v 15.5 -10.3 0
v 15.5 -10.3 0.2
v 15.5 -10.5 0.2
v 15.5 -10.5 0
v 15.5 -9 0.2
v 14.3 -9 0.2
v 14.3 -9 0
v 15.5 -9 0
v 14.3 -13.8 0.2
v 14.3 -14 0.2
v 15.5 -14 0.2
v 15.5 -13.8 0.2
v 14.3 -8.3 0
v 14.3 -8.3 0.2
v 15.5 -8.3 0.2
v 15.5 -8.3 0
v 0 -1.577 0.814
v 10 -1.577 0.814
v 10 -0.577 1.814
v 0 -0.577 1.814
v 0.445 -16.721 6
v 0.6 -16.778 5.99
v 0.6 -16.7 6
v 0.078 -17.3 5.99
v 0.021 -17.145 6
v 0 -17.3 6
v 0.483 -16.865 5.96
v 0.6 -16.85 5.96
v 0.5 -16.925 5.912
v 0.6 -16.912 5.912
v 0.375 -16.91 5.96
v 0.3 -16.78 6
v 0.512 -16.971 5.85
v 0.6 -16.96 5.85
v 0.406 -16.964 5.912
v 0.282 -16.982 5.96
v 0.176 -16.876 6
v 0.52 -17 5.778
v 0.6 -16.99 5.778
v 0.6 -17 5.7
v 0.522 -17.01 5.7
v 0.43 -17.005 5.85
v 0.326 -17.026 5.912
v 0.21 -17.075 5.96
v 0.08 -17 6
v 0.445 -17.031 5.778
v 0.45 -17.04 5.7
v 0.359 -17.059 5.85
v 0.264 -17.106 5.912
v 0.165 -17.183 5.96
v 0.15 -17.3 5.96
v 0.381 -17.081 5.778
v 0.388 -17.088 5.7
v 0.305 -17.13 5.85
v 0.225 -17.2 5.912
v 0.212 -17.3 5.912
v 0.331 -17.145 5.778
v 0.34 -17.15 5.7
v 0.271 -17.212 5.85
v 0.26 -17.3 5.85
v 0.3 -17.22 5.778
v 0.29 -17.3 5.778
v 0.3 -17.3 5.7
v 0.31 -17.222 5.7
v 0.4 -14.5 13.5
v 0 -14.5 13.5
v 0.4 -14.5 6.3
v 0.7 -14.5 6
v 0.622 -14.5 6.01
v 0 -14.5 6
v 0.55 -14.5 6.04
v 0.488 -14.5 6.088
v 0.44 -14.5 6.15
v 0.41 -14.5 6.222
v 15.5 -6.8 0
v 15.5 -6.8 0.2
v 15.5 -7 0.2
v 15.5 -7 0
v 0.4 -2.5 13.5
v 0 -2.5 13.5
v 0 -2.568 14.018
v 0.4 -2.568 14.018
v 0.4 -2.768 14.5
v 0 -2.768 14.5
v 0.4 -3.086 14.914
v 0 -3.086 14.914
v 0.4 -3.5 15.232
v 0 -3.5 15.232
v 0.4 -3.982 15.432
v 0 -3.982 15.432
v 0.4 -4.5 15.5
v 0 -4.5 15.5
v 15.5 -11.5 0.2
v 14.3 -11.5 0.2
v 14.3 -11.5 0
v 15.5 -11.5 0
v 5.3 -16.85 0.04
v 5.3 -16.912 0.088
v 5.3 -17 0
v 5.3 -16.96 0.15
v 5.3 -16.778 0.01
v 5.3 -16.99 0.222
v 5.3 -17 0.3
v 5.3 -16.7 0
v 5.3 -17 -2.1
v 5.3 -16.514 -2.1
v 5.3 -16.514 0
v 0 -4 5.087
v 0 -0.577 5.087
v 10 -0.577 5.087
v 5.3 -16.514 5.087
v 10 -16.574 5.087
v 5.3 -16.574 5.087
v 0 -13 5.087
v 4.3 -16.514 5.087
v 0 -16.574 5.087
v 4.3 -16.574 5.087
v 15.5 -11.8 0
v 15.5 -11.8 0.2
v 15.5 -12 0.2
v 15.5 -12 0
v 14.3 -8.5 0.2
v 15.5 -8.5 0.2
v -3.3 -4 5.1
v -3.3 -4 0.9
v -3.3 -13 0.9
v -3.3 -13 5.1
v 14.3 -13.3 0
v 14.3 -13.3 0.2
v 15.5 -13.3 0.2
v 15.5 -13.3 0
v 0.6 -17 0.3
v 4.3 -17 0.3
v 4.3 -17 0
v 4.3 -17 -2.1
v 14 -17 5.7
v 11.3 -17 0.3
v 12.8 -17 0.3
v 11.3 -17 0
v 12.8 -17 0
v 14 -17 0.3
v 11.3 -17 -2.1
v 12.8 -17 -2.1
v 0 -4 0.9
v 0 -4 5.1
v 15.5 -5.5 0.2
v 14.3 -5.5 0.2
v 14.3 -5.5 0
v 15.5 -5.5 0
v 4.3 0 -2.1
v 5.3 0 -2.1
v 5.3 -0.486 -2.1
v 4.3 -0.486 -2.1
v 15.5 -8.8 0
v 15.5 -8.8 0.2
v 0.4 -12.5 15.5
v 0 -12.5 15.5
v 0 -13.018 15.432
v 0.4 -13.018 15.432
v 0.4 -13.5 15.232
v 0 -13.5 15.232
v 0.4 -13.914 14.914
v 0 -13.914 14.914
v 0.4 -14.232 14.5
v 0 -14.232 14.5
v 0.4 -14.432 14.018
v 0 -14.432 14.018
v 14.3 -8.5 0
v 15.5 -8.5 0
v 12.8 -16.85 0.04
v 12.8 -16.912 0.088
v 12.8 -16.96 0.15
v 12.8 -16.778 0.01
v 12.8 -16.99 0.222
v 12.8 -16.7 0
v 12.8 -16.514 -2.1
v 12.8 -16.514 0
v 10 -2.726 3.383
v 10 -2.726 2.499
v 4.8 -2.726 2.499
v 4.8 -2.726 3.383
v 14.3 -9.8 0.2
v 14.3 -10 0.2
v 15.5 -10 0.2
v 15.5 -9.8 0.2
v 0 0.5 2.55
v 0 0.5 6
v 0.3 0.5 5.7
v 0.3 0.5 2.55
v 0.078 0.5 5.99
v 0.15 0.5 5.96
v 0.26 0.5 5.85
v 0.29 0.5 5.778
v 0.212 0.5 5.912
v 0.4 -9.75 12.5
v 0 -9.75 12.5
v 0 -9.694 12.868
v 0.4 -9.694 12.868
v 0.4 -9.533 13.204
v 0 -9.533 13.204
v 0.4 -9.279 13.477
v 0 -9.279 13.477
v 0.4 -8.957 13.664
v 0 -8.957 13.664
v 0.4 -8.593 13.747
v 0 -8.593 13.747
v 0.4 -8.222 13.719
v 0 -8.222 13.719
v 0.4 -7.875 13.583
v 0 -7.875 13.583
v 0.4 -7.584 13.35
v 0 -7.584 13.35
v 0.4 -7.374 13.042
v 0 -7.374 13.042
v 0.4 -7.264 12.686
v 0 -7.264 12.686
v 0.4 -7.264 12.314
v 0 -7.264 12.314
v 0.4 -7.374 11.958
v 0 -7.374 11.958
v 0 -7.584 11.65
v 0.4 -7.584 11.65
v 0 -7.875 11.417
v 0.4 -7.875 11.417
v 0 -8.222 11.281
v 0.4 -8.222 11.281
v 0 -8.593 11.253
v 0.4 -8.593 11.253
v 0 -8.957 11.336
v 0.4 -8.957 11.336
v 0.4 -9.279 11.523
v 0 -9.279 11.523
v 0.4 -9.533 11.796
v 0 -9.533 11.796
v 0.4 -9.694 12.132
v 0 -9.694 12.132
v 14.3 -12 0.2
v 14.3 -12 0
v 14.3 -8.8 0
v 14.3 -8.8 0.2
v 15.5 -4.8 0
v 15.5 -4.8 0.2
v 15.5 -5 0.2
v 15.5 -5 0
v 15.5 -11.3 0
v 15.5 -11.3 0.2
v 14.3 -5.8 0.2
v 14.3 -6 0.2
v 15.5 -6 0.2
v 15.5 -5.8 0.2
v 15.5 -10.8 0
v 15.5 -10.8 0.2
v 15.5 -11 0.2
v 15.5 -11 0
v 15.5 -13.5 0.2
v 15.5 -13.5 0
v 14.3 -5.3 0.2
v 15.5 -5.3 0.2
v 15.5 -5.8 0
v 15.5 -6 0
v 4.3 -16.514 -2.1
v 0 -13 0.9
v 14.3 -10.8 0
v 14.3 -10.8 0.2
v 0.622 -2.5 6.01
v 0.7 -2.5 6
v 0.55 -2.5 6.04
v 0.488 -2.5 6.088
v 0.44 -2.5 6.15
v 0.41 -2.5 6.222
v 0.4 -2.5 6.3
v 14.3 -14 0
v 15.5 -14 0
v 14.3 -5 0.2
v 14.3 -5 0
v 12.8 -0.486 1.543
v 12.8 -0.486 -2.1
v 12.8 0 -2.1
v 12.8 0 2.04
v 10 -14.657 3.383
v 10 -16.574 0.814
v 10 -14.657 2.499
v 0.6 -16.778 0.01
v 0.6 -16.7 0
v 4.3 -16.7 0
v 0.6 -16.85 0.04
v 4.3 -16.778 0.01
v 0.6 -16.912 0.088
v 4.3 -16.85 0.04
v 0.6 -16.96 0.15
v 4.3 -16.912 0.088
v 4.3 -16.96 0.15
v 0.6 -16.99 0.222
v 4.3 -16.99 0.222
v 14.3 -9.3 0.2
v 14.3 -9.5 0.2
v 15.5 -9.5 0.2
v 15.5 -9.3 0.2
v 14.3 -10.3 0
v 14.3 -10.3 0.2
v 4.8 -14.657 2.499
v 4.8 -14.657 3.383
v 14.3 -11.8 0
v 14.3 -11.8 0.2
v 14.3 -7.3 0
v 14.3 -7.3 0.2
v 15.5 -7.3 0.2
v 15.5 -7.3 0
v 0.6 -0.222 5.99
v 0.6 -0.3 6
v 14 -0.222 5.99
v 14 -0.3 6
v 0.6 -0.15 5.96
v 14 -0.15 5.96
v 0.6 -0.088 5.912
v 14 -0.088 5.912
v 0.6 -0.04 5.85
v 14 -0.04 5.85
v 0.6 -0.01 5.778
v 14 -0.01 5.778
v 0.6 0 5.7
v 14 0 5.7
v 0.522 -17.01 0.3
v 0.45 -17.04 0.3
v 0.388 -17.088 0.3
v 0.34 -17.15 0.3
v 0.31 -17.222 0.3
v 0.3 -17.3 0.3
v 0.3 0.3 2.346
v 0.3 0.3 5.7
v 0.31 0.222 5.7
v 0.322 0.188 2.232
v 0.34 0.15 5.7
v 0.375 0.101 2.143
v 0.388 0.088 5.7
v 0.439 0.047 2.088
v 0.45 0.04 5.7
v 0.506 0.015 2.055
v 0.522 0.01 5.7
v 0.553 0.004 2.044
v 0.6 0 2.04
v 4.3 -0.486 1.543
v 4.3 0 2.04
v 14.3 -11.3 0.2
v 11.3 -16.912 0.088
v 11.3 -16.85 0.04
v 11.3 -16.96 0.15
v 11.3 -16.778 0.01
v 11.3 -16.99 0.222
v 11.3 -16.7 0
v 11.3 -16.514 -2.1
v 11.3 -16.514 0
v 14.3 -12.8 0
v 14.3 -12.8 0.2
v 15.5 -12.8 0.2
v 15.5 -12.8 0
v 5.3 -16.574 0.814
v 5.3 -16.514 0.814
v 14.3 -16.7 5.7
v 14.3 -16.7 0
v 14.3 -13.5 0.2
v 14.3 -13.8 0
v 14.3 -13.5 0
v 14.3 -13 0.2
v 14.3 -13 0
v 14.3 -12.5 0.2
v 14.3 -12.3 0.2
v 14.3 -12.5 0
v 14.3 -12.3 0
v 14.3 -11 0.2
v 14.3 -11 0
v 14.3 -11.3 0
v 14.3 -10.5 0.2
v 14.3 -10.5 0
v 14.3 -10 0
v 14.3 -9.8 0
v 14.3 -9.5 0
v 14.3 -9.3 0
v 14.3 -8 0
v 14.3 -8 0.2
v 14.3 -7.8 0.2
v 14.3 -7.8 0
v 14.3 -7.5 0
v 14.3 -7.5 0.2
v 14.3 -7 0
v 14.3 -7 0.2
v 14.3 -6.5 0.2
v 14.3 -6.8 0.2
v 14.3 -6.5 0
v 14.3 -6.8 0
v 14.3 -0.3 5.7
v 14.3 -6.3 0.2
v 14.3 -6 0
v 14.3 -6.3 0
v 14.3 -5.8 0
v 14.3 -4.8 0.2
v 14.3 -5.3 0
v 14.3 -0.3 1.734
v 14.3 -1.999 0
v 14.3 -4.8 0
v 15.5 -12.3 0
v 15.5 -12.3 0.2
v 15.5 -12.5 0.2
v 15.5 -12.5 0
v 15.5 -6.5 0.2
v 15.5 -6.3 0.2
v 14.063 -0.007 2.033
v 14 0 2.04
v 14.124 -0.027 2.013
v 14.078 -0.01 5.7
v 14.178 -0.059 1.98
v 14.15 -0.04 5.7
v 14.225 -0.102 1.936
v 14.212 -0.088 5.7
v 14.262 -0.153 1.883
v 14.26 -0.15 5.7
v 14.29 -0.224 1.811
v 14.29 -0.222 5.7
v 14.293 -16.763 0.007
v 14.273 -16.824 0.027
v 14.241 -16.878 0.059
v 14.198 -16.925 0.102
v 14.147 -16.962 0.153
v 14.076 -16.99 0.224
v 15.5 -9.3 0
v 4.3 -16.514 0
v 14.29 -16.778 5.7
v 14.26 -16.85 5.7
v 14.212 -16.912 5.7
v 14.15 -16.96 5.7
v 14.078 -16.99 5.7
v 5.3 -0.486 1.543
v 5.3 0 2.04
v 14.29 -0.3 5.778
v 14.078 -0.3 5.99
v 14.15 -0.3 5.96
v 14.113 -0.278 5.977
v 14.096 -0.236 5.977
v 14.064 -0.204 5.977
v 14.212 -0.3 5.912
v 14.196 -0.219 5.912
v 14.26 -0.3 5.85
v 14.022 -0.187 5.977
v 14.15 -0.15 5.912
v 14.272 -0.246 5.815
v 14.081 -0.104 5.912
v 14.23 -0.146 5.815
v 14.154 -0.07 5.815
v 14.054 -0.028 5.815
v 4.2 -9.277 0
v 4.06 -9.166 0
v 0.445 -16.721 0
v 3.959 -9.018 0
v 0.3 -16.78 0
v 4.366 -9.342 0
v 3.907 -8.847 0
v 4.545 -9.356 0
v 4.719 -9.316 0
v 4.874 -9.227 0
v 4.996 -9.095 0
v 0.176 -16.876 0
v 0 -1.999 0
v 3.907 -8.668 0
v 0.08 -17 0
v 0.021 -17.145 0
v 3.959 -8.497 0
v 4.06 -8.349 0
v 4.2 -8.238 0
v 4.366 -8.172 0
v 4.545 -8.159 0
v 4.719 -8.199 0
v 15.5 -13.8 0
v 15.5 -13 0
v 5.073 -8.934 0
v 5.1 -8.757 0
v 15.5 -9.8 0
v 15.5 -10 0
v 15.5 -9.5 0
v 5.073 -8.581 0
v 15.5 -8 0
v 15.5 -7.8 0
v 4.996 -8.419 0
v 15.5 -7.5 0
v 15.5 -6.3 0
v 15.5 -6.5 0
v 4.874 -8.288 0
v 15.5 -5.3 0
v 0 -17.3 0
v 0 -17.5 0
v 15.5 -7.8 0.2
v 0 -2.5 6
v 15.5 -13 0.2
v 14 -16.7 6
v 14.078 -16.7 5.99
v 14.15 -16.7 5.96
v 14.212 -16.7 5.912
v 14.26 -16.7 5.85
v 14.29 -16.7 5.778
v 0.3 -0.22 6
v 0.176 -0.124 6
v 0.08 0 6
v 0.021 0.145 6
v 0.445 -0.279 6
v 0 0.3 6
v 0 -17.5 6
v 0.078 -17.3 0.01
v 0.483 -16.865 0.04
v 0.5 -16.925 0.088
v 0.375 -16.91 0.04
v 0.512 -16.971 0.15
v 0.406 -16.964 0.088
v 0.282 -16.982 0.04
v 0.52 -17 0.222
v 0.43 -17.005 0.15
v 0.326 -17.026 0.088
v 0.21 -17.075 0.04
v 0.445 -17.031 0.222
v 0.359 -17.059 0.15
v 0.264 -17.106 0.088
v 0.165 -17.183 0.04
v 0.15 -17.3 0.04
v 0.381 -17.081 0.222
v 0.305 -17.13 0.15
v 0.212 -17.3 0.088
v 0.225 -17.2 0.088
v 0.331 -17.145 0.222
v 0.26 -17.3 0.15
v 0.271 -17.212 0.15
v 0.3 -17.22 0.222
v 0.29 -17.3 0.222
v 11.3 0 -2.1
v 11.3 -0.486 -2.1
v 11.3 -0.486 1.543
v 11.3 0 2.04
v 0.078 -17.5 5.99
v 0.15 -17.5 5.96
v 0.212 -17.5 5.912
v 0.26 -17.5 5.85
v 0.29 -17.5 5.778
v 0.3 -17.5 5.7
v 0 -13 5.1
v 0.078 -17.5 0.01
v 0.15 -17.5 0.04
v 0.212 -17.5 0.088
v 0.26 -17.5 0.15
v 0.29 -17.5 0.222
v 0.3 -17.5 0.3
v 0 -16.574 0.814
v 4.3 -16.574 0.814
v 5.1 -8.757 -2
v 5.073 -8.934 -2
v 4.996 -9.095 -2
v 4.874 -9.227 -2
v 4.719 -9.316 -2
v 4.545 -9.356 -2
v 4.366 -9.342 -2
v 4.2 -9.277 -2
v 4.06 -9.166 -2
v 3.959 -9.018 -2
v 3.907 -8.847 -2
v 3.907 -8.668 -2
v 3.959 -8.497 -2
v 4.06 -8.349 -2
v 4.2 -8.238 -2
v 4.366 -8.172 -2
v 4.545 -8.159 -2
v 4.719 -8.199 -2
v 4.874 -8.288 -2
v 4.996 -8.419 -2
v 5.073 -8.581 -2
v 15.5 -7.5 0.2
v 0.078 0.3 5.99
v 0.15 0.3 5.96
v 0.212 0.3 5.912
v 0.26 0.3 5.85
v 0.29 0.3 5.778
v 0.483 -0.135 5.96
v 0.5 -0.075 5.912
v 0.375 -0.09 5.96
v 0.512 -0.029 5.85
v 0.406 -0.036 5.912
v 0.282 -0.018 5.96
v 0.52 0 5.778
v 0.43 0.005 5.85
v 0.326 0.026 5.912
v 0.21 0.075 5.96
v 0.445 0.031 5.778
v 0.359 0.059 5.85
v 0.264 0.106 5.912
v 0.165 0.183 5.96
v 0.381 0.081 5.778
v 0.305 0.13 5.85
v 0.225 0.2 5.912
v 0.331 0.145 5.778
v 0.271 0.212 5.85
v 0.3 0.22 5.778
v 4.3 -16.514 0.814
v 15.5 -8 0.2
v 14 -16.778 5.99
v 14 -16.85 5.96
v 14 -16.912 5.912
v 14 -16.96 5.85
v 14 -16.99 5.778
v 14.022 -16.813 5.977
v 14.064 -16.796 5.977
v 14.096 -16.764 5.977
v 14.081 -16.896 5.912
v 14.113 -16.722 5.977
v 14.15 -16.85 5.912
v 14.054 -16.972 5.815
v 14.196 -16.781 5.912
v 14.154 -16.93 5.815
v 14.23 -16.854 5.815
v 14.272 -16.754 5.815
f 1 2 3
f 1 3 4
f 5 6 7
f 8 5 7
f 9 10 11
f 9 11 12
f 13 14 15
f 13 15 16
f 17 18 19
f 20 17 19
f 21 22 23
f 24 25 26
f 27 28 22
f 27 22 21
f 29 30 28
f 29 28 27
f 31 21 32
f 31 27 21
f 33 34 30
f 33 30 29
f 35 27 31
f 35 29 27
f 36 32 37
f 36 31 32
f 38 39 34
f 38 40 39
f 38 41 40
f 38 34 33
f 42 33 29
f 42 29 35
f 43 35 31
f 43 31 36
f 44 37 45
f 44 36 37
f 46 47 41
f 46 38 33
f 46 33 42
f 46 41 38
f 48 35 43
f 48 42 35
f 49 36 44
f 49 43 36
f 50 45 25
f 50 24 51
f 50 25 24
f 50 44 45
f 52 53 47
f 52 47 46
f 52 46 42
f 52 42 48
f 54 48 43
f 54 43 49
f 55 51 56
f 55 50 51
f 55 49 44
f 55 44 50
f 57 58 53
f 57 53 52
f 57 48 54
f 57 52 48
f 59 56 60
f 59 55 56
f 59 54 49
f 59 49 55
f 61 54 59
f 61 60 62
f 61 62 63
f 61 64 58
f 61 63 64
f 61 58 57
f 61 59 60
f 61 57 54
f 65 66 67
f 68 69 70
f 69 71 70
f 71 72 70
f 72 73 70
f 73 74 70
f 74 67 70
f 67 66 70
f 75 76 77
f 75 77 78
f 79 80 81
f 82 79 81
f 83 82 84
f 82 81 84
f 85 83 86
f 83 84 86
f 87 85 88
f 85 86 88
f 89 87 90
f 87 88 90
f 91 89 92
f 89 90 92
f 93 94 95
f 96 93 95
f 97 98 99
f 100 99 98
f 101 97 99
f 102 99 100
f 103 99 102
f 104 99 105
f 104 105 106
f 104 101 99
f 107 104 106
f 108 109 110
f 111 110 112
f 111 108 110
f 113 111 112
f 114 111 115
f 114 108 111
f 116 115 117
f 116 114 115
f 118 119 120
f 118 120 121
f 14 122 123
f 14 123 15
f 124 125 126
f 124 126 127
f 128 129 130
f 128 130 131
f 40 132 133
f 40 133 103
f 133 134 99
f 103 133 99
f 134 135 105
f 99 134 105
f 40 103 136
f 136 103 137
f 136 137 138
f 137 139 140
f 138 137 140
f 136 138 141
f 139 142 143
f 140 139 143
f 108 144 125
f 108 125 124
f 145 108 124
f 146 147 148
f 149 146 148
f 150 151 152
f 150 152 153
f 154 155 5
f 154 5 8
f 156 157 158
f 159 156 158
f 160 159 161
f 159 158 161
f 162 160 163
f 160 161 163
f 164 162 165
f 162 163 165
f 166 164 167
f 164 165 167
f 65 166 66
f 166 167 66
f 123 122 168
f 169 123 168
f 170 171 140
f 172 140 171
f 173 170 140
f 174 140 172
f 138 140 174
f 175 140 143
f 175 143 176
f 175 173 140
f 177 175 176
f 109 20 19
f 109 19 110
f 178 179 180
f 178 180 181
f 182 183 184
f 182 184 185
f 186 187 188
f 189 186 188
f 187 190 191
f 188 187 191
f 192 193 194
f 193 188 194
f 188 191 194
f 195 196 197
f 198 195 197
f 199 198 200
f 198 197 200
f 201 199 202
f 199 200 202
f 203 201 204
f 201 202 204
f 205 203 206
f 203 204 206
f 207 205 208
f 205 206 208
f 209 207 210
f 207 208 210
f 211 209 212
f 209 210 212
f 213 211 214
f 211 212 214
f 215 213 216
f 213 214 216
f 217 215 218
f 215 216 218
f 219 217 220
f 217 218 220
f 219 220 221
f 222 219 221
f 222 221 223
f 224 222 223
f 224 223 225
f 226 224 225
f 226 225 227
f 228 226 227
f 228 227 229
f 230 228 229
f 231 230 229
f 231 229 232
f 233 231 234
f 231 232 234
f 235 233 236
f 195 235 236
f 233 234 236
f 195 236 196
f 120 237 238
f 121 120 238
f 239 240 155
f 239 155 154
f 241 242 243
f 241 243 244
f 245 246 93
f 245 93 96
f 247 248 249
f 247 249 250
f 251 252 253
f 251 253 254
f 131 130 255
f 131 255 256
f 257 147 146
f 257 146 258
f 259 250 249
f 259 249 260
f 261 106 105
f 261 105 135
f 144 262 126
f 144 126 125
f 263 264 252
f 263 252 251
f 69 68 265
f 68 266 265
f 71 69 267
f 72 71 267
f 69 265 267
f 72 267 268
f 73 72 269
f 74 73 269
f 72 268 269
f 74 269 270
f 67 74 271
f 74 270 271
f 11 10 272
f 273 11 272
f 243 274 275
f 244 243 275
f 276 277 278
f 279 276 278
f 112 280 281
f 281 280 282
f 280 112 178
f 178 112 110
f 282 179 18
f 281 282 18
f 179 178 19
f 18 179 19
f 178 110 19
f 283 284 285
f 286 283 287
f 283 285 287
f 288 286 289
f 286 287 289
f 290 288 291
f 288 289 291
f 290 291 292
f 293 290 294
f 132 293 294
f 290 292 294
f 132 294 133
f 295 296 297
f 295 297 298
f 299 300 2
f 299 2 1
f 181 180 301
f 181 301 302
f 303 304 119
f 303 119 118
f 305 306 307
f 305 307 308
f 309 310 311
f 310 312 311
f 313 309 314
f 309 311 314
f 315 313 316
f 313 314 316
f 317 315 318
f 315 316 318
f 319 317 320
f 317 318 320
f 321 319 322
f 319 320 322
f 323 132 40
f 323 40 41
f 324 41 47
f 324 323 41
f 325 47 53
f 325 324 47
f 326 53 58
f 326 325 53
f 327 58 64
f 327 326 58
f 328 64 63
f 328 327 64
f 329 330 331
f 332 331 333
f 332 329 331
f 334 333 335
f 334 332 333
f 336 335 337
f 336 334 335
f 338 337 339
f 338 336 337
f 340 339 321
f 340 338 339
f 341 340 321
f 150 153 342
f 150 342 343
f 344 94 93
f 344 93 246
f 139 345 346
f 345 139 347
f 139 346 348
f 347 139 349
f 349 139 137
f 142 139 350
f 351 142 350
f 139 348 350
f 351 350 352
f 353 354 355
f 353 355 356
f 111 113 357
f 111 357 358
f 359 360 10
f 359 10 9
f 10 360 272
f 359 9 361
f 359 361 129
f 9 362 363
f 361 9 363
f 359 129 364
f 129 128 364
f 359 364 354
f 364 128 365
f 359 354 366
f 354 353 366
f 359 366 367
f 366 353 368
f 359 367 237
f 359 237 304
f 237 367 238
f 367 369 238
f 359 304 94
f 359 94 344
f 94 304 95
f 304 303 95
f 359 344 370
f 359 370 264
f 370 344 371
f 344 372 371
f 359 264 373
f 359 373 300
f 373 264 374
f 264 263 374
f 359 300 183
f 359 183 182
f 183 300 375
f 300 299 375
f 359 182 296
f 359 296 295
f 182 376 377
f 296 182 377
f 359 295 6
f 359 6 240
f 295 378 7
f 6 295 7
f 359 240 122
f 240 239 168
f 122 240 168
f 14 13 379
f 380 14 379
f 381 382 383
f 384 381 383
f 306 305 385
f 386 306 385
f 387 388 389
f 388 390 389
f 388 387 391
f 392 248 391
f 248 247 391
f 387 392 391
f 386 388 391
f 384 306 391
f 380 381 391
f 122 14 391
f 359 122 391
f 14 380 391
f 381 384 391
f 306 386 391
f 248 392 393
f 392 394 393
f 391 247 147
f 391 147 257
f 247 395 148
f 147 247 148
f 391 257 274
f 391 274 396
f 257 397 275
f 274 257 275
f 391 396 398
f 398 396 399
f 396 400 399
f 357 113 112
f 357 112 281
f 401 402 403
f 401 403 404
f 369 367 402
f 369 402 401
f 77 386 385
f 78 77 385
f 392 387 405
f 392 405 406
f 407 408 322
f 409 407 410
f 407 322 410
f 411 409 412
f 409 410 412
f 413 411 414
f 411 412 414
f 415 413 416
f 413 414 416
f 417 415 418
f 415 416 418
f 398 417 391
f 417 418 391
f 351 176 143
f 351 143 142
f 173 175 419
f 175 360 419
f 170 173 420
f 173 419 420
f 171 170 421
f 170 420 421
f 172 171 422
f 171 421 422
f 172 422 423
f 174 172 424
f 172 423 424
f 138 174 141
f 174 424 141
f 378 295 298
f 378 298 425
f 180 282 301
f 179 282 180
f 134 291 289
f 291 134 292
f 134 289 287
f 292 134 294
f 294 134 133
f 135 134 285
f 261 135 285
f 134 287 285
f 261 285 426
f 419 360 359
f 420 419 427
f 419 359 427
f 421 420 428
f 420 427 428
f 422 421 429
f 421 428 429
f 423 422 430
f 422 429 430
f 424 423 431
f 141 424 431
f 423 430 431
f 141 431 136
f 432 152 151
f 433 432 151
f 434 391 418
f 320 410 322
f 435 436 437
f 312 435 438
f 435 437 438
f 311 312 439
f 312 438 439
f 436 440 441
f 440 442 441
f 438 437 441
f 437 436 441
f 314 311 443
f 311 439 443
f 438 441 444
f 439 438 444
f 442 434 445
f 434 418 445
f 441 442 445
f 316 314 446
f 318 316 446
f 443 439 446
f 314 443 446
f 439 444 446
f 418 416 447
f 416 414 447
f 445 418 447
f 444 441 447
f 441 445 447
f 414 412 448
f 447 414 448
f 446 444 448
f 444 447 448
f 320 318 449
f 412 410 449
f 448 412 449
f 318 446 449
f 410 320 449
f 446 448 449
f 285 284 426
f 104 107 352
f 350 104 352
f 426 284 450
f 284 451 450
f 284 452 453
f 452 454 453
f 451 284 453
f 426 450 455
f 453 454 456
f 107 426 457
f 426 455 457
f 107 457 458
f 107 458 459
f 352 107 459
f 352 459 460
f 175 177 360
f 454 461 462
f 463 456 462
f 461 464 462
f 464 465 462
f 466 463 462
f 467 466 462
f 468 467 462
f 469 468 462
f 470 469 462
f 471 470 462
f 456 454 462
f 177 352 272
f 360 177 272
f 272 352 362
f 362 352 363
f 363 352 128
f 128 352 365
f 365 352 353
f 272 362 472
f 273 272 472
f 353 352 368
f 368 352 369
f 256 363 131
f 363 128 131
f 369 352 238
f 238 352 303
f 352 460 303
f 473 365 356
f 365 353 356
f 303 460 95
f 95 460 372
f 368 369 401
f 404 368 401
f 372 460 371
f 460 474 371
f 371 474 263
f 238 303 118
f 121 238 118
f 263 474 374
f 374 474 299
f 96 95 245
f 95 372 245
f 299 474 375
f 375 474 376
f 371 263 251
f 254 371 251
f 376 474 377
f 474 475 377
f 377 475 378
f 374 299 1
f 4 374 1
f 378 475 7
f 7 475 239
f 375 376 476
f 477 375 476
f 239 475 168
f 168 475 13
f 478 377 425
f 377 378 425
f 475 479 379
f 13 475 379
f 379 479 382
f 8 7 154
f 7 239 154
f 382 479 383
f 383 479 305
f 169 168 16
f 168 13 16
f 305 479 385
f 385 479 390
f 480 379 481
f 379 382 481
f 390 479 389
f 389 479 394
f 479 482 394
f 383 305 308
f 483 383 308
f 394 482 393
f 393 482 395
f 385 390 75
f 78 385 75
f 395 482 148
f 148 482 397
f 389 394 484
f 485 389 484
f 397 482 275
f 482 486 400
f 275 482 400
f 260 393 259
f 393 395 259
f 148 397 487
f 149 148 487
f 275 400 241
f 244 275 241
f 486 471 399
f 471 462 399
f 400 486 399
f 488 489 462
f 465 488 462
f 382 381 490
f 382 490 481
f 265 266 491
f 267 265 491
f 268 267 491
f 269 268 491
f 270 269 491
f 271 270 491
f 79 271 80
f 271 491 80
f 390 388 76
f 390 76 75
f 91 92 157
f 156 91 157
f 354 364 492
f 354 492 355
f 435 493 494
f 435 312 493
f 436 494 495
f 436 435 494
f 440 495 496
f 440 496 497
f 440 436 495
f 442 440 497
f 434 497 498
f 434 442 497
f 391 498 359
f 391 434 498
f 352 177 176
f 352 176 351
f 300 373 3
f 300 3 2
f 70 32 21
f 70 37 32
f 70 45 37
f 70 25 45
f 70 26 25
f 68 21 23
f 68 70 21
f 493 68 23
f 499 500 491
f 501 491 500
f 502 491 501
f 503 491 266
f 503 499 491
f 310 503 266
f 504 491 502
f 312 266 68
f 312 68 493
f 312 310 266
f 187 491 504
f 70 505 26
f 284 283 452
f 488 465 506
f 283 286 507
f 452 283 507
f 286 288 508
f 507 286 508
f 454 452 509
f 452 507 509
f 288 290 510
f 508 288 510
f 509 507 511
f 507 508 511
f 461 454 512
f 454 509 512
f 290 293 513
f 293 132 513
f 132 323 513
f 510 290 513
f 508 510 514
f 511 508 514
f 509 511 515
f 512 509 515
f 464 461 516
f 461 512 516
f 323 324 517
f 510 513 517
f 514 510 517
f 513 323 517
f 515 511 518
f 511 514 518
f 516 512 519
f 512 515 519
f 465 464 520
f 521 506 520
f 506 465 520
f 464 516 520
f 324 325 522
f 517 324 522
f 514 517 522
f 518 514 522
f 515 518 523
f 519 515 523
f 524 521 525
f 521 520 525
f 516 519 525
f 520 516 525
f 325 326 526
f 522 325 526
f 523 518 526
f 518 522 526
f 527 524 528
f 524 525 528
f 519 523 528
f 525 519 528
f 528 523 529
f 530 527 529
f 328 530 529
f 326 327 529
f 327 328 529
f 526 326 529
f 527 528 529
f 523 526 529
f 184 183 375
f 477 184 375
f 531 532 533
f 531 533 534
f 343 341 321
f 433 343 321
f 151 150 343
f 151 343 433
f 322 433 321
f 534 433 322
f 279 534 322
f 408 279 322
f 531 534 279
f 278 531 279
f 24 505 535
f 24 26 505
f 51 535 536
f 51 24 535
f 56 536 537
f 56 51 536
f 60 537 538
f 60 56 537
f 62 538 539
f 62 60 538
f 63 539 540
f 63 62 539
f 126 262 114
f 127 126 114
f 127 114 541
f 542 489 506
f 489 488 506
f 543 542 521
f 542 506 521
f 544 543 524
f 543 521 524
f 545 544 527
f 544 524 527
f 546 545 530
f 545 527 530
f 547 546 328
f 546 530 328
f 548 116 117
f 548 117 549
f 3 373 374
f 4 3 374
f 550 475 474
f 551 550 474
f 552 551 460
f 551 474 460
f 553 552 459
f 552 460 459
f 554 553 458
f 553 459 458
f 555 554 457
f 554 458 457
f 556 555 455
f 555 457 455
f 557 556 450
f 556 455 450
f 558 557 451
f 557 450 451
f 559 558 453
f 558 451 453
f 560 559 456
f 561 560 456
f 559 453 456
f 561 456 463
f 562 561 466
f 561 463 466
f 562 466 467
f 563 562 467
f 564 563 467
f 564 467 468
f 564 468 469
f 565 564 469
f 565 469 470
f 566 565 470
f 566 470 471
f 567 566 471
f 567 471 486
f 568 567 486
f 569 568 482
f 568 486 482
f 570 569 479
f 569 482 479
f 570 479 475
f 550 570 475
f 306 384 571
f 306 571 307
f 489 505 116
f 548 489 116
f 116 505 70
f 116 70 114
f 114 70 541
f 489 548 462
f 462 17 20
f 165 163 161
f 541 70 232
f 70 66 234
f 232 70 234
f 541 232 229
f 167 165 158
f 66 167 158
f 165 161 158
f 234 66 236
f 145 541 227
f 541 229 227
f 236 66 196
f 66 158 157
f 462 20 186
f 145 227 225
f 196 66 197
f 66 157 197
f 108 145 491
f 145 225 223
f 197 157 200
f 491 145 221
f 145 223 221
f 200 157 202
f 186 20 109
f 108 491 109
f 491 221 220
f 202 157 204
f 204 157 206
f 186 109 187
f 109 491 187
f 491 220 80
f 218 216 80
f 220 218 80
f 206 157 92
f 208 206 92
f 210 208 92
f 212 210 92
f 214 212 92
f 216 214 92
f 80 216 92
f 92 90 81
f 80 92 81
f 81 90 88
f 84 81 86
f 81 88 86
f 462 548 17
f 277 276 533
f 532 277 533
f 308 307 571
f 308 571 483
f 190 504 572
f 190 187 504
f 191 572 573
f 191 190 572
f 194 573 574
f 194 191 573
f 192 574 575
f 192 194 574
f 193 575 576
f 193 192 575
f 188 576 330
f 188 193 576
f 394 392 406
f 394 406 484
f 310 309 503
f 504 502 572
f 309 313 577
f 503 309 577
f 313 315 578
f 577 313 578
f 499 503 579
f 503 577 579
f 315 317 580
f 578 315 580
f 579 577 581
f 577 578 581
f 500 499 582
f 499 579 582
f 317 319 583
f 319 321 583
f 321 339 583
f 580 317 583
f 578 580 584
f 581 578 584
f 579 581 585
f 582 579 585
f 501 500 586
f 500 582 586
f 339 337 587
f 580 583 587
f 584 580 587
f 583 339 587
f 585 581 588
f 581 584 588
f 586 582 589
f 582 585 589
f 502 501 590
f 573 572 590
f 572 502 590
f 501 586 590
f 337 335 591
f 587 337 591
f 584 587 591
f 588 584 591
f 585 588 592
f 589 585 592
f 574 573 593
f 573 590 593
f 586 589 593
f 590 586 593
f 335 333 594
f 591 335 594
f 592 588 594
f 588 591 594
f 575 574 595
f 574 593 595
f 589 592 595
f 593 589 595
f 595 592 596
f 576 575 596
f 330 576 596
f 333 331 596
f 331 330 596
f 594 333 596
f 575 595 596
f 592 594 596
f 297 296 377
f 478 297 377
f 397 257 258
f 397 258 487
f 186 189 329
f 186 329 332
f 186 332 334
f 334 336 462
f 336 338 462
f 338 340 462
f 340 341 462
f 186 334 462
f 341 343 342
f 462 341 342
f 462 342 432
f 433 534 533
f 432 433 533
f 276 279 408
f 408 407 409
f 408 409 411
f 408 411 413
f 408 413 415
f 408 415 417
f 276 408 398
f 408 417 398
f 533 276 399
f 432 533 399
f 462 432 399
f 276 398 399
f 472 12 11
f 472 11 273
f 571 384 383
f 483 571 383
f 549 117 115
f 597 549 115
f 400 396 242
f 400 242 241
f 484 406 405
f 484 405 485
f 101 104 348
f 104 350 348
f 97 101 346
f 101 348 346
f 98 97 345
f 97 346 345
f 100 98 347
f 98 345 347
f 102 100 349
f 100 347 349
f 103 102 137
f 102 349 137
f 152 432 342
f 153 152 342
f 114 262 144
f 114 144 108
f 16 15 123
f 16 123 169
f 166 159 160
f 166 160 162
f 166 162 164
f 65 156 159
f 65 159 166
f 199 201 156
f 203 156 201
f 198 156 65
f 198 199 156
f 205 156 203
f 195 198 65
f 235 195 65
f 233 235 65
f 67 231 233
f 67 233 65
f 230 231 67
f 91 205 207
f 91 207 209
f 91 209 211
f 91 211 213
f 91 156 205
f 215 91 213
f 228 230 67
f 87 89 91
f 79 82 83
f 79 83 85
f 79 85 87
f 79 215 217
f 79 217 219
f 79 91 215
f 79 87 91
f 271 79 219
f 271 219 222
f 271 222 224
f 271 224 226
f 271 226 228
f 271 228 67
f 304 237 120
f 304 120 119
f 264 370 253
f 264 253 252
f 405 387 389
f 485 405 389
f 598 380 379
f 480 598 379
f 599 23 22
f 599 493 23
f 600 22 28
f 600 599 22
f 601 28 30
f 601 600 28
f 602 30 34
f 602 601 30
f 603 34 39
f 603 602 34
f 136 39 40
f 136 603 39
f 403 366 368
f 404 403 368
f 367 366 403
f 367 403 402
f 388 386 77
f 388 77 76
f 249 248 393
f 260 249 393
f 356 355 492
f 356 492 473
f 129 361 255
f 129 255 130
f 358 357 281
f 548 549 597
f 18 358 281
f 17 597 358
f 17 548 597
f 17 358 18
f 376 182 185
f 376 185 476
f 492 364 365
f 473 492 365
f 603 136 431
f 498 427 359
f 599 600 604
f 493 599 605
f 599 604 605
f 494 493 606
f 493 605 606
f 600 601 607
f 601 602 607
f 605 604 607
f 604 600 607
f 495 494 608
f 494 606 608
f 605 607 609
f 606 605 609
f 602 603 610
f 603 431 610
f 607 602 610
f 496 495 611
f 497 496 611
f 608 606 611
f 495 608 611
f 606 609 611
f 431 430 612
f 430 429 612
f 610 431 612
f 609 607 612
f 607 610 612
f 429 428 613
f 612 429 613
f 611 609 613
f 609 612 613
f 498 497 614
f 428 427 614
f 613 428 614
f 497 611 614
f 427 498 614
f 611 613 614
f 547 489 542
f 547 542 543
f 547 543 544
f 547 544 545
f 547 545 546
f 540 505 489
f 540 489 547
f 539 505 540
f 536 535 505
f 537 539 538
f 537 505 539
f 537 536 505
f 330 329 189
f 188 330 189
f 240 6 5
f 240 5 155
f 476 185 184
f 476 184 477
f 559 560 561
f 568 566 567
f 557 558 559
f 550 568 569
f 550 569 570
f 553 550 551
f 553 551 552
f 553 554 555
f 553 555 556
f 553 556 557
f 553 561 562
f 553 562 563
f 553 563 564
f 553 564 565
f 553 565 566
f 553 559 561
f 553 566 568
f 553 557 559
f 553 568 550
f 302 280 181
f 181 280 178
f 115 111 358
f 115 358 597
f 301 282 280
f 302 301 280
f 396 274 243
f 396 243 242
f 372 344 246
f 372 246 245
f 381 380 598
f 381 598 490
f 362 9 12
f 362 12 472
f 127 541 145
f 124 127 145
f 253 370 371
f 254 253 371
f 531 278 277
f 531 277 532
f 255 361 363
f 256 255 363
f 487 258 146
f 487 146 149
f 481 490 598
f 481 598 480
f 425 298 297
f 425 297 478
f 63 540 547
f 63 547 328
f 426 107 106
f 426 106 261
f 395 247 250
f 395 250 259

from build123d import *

# Parameters (mm, degrees)
SKETCH_1_W             = 14.3
SKETCH_1_H             = 17
EXTRUDE_1_DEPTH        = 6
SKETCH_3_W             = 0.2
SKETCH_3_H             = 0.2
EXTRUDE_3_DEPTH        = 1.2
PATTERN_LINEAR_1_COUNT = 19
PATTERN_LINEAR_1_PITCH = 0.5
SKETCH_4_W             = 0.3
SKETCH_4_H             = 0.5
EXTRUDE_4_DEPTH        = 6
CUT_EXTRUDE_1_DEPTH    = 10
SKETCH_8_W             = 0.883352336
SKETCH_8_H             = 11.931096145
EXTRUDE_6_DEPTH        = 5.2
CUT_EXTRUDE_4_DEPTH    = 24.382472068
EXTRUDE_7_DEPTH        = 2.1
EXTRUDE_7_DEPTH_BACK   = 5.2
SKETCH_12_W            = 1.5
SKETCH_12_H            = 0.486445161
SKETCH_12_W_2          = 1
SKETCH_13_R            = 0.6
EXTRUDE_8_DEPTH        = 2
SKETCH_15_R            = 1.25
EXTRUDE_9_DEPTH        = 0.4
SKETCH_16_W            = 4.2
SKETCH_16_H            = 9
EXTRUDE_10_DEPTH       = 3.3
FILLET_1_R             = 0.3


with BuildPart() as part:
    # 草图1 → 凸台-拉伸1 (new body)
    with BuildSketch(Plane.XY):
        with Locations((7.15, -8.5)):
            Rectangle(SKETCH_1_W, SKETCH_1_H)
    extrude(amount=EXTRUDE_1_DEPTH)

    # 草图3 → 凸台-拉伸3 (add)
    with BuildSketch(Plane(origin=(14.3, 0, 0), x_dir=(0, 0, -1), z_dir=(1, 0, 0))):
        with Locations((-0.1, -13.9)):
            Rectangle(SKETCH_3_W, SKETCH_3_H)
    extrude_3 = extrude(amount=EXTRUDE_3_DEPTH)

    # 阵列(线性)1: 凸台-拉伸3 ×19
    with Locations(*[(0, i * PATTERN_LINEAR_1_PITCH, 0) for i in range(1, PATTERN_LINEAR_1_COUNT)]):
        add(extrude_3)

    # 草图4 → 凸台-拉伸4 (add)
    with BuildSketch(Plane.XY.offset(6)):
        with Locations((0.15, 0.25)):
            Rectangle(SKETCH_4_W, SKETCH_4_H)
        with Locations((0.15, -17.25)):
            Rectangle(SKETCH_4_W, SKETCH_4_H)
    extrude(amount=-EXTRUDE_4_DEPTH)

    # 草图6 → 切除-拉伸1 (cut)
    with BuildSketch(Plane.ZY):
        Polygon((0.814275945, -1.576993803), (1.814275945, -0.576993803), (5.086945076, -0.576993803), (5.086945076, -16.573920601), (0.814275945, -16.573920601), align=None)
    extrude(amount=-CUT_EXTRUDE_1_DEPTH, mode=Mode.SUBTRACT)

    # 草图8 → 凸台-拉伸6 (add)
    with BuildSketch(Plane.ZY.offset(-10)):
        with Locations((2.941004683, -8.691870864)):
            Rectangle(SKETCH_8_W, SKETCH_8_H)
    extrude(amount=EXTRUDE_6_DEPTH)

    # 草图11 → 切除-拉伸4 (cut, through all)
    with BuildSketch(Plane(origin=(14.3, 0, 0), x_dir=(0, 0, -1), z_dir=(1, 0, 0))):
        Polygon((-2.744957318, 0.690687189), (0.440532754, -2.430132002), (0.440532754, 0.690687189), align=None)
    extrude(amount=-CUT_EXTRUDE_4_DEPTH, mode=Mode.SUBTRACT)

    # 草图12 → 凸台-拉伸7 (add, two sides: drawn at the far end of the back side and taken through both)
    with BuildSketch(Plane(origin=(0, 0, 0), x_dir=(-1, 0, 0), z_dir=(0, 0, -1)).offset(-EXTRUDE_7_DEPTH_BACK)):
        with Locations((-12.05, -16.75677742)):
            Rectangle(SKETCH_12_W, SKETCH_12_H)
        with Locations((-4.8, -16.75677742)):
            Rectangle(SKETCH_12_W_2, SKETCH_12_H)
        with Locations((-4.8, -0.243222581)):
            Rectangle(SKETCH_12_W_2, SKETCH_12_H)
        with Locations((-12.05, -0.243222581)):
            Rectangle(SKETCH_12_W, SKETCH_12_H)
    extrude(amount=EXTRUDE_7_DEPTH + EXTRUDE_7_DEPTH_BACK)

    # 草图13 → 凸台-拉伸8 (add)
    with BuildSketch(Plane(origin=(0, 0, 0), x_dir=(-1, 0, 0), z_dir=(0, 0, -1))):
        with Locations(Location((-4.5, -8.757432115, 0), (0, 0, 180))):
            Circle(SKETCH_13_R)
    extrude(amount=EXTRUDE_8_DEPTH)

    # 草图15 → 凸台-拉伸9 (add)
    with BuildSketch(Plane.ZY):
        with BuildLine():
            Line((6, -2.5), (13.5, -2.5))
            ThreePointArc((13.5, -2.5), (14.914213562, -3.085786438), (15.5, -4.5))
            Line((15.5, -4.5), (15.5, -12.5))
            ThreePointArc((15.5, -12.5), (14.914213562, -13.914213562), (13.5, -14.5))
            Line((13.5, -14.5), (6, -14.5))
            Line((6, -14.5), (6, -2.5))
        make_face()
        with Locations(Location((12.5, -8.5, 0), (0, 0, 270))):
            Circle(SKETCH_15_R, mode=Mode.SUBTRACT)
    extrude(amount=-EXTRUDE_9_DEPTH)

    # 草图16 → 凸台-拉伸10 (add)
    with BuildSketch(Plane.ZY):
        with Locations((3, -8.5)):
            Rectangle(SKETCH_16_W, SKETCH_16_H)
    extrude(amount=EXTRUDE_10_DEPTH)

    # 圆角1
    fillet_1_edges = [part.edges().sort_by_distance(p)[0] for p in [
        (0.3, 0.25, 6),
        (0.3, -17.25, 0),
        (0.3, -17.25, 6),
        (0.3, 0, 4.019978715),
        (0.4, -8.5, 6),
        (0.3, -17, 3),
        (2.3, -17, 0),
        (8.3, -17, 0),
        (13.55, -17, 0),
        (14.3, -17, 3),
        (7.3, -17, 6),
        (14.3, 0, 4.019978715),
        (14.3, -8.5, 6),
        (7.3, 0, 6),
    ]]
    fillet(fillet_1_edges, radius=FILLET_1_R - 0.0001)  # a hair under: the kernel refuses the full size


solid = part.part
